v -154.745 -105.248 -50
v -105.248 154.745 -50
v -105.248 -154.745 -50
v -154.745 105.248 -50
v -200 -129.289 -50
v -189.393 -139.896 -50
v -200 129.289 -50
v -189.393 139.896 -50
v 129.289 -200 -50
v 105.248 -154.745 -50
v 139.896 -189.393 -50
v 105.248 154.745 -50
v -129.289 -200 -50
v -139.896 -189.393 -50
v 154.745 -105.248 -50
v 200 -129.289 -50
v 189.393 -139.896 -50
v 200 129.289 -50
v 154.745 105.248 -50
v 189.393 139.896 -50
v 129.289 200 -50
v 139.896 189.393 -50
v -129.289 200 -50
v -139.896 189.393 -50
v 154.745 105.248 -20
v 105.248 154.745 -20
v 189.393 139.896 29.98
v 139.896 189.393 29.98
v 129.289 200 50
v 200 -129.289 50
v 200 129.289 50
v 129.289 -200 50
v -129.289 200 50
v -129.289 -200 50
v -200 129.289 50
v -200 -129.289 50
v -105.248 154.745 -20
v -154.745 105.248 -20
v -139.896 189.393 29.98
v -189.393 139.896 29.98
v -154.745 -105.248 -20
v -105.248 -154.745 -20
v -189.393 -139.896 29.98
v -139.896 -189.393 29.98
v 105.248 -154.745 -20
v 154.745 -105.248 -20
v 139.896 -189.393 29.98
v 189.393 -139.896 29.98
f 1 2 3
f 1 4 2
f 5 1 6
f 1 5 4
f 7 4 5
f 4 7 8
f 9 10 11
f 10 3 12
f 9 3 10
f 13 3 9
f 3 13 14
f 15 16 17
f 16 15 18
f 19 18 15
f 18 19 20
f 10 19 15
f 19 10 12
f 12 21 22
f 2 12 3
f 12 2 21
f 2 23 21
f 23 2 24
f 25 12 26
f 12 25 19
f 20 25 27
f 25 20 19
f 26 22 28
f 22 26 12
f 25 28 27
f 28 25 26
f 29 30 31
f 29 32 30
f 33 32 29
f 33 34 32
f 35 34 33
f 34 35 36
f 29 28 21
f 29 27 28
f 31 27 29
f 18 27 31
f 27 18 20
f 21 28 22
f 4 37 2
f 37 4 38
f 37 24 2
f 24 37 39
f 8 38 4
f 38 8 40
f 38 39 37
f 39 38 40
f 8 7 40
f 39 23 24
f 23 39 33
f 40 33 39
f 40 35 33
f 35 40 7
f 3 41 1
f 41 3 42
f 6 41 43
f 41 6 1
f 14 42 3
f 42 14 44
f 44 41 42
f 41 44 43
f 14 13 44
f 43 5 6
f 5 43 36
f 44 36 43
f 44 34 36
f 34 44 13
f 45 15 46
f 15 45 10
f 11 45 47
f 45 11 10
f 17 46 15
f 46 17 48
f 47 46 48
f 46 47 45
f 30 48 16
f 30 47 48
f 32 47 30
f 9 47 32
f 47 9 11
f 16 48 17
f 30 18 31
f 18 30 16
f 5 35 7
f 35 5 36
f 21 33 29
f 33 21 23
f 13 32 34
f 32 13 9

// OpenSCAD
// file: atis_lib.scad
module gyuru(r1, r2,h, w, center=false){
    difference(){
        cylinder(r1=r1,r2=r2,h, center=center, $fn=12*r1);
        translate([0,0,-0.1])cylinder(r1=r1-w, r2=r2-w,h+0.2, center=center, $fn=12*(r1-w)); // trükközés: már preview-ban is normálisan jelenjen meg a gyűrű
    }
}

//inset_width= min(nozzle dia/2, 0.4)
module inset_first_layer(inset_height=0.31,inset_width=0.2, render=false)
{   
    if (render == true){
        difference()
        { 
            children();

            translate([0,0,-1])
            linear_extrude(height=inset_height+1)
            difference()
            {
                offset(r = inset_width) 
                projection(cut=true) 
                translate([0,0,-inset_height])
                children();

                offset(r = -inset_width) 
                projection(cut=true) 
                translate([0,0,-inset_height])
                children();
            }
        } 
    }
    else{
        echo("Inset not rendered!");
    }
} 

module deszka(m, sz, v, vastagsag, cimke){
    cube([m,sz,v], center=true);
    if (m == vastagsag){
        t = sz * v;
        echo(cimke, m , sz, v, t/1000/1000);
    } else if (sz == vastagsag){
            t = m*v;
            echo(cimke, m , sz, v, t/1000/1000);
    } else if (v == vastagsag){
            t = m*sz;
            echo(cimke, m , sz, v, t/1000/1000);
    }
    echo(cimke, m , sz, v, t);
}



// csm=[melyseg, szelesseg, magassag, also resz magassag, ,henger sugara

//csatlakozo([5,10,20,2,2,1.5]);

module csatlakozo(csm){
    cw = csm[0];
    sz = csm[1];
    h = csm[2];
    ch = csm[3];
    ny = csm[4];
    R=csm[5];
    translate([-cw/2, -sz/2, -h/2]){
        cube([cw,sz,ch]);
        translate([0,sz,ch])
            rotate([90,0,0])
                linear_extrude(height=sz)polygon([[0,0], [cw, 0], [0,cw+1], [0,0]]);
        translate([0,(sz-ny)/2,0])
        intersection()
        {
            translate([0,R+ny/2,0])
                rotate([90,0,0])
                    linear_extrude(height=2*R)polygon([[0,0], [cw, 0], [cw, h-cw-1], [0,h], [0,0]]);
            union(){
                cube([cw-R,ny, h]);
                translate([cw-R-0.5,ny/2,0]) cylinder(r=R, h=h,$fn=80);
            }
        }
    }
}

module gombolyitett_csatlakozo(csm){
    cw = csm[0]-1;
    sz = csm[1]-2;
    h = csm[2]-2;
    ch = csm[3];
    ny = csm[4];
    R=csm[5];
    translate([-cw/2, -sz/2, -h/2]){
        cube([cw,sz,ch]);
        translate([0,sz,ch])
            rotate([90,0,0])
                linear_extrude(height=sz)polygon([[0,0], [cw, 0], [0,cw+1], [0,0]]);
        translate([0,(sz-ny)/2,0])
        intersection()
        {
            translate([0,R+ny/2,0])
                rotate([90,0,0])
                    linear_extrude(height=2*R)polygon([[0,0], [cw, 0], [cw, h-cw-1], [0,h], [0,0]]);
            union(){
                cube([ny, ny,h]);
                translate([cw-R-0.5,ny/2,0]) cylinder(r=R, h=h,$fn=80);
            }
        }
    }
}

module kivagas(l, d, w){
    hull(){
        cylinder(r=d/2,h = w-2, $fn=12*d/2);
        translate([l-d,0,0])cylinder(r=d/2, h=w-2, $fn=12*d/2);
    }
    translate([0,0,w-2])hull(){
        cylinder(r1=d/2, r2=d/2+2,h = 2, $fn=12*d/2);
        translate([l-d,0,0])cylinder(r1=d/2, r2=d/2+2, h=2, $fn=12*d/2);
    }
}
// main file
use <atis_lib.scad>

//csatlakozo([45,60,80,5,25,15]);

uloke_elem();

module uloke_elem(){
    difference(){
        cube([400,400,100], center=true);
        for (sz = [0:90:270]){
            rotate(sz){
                translate([200,200,0])rotate(45){
                    cube(100, center=true);
                    translate([-74,0,-10])rotate(180)csatlakozo([50,70,80,30,35,15]);
                }
            }
        }
    }
}
